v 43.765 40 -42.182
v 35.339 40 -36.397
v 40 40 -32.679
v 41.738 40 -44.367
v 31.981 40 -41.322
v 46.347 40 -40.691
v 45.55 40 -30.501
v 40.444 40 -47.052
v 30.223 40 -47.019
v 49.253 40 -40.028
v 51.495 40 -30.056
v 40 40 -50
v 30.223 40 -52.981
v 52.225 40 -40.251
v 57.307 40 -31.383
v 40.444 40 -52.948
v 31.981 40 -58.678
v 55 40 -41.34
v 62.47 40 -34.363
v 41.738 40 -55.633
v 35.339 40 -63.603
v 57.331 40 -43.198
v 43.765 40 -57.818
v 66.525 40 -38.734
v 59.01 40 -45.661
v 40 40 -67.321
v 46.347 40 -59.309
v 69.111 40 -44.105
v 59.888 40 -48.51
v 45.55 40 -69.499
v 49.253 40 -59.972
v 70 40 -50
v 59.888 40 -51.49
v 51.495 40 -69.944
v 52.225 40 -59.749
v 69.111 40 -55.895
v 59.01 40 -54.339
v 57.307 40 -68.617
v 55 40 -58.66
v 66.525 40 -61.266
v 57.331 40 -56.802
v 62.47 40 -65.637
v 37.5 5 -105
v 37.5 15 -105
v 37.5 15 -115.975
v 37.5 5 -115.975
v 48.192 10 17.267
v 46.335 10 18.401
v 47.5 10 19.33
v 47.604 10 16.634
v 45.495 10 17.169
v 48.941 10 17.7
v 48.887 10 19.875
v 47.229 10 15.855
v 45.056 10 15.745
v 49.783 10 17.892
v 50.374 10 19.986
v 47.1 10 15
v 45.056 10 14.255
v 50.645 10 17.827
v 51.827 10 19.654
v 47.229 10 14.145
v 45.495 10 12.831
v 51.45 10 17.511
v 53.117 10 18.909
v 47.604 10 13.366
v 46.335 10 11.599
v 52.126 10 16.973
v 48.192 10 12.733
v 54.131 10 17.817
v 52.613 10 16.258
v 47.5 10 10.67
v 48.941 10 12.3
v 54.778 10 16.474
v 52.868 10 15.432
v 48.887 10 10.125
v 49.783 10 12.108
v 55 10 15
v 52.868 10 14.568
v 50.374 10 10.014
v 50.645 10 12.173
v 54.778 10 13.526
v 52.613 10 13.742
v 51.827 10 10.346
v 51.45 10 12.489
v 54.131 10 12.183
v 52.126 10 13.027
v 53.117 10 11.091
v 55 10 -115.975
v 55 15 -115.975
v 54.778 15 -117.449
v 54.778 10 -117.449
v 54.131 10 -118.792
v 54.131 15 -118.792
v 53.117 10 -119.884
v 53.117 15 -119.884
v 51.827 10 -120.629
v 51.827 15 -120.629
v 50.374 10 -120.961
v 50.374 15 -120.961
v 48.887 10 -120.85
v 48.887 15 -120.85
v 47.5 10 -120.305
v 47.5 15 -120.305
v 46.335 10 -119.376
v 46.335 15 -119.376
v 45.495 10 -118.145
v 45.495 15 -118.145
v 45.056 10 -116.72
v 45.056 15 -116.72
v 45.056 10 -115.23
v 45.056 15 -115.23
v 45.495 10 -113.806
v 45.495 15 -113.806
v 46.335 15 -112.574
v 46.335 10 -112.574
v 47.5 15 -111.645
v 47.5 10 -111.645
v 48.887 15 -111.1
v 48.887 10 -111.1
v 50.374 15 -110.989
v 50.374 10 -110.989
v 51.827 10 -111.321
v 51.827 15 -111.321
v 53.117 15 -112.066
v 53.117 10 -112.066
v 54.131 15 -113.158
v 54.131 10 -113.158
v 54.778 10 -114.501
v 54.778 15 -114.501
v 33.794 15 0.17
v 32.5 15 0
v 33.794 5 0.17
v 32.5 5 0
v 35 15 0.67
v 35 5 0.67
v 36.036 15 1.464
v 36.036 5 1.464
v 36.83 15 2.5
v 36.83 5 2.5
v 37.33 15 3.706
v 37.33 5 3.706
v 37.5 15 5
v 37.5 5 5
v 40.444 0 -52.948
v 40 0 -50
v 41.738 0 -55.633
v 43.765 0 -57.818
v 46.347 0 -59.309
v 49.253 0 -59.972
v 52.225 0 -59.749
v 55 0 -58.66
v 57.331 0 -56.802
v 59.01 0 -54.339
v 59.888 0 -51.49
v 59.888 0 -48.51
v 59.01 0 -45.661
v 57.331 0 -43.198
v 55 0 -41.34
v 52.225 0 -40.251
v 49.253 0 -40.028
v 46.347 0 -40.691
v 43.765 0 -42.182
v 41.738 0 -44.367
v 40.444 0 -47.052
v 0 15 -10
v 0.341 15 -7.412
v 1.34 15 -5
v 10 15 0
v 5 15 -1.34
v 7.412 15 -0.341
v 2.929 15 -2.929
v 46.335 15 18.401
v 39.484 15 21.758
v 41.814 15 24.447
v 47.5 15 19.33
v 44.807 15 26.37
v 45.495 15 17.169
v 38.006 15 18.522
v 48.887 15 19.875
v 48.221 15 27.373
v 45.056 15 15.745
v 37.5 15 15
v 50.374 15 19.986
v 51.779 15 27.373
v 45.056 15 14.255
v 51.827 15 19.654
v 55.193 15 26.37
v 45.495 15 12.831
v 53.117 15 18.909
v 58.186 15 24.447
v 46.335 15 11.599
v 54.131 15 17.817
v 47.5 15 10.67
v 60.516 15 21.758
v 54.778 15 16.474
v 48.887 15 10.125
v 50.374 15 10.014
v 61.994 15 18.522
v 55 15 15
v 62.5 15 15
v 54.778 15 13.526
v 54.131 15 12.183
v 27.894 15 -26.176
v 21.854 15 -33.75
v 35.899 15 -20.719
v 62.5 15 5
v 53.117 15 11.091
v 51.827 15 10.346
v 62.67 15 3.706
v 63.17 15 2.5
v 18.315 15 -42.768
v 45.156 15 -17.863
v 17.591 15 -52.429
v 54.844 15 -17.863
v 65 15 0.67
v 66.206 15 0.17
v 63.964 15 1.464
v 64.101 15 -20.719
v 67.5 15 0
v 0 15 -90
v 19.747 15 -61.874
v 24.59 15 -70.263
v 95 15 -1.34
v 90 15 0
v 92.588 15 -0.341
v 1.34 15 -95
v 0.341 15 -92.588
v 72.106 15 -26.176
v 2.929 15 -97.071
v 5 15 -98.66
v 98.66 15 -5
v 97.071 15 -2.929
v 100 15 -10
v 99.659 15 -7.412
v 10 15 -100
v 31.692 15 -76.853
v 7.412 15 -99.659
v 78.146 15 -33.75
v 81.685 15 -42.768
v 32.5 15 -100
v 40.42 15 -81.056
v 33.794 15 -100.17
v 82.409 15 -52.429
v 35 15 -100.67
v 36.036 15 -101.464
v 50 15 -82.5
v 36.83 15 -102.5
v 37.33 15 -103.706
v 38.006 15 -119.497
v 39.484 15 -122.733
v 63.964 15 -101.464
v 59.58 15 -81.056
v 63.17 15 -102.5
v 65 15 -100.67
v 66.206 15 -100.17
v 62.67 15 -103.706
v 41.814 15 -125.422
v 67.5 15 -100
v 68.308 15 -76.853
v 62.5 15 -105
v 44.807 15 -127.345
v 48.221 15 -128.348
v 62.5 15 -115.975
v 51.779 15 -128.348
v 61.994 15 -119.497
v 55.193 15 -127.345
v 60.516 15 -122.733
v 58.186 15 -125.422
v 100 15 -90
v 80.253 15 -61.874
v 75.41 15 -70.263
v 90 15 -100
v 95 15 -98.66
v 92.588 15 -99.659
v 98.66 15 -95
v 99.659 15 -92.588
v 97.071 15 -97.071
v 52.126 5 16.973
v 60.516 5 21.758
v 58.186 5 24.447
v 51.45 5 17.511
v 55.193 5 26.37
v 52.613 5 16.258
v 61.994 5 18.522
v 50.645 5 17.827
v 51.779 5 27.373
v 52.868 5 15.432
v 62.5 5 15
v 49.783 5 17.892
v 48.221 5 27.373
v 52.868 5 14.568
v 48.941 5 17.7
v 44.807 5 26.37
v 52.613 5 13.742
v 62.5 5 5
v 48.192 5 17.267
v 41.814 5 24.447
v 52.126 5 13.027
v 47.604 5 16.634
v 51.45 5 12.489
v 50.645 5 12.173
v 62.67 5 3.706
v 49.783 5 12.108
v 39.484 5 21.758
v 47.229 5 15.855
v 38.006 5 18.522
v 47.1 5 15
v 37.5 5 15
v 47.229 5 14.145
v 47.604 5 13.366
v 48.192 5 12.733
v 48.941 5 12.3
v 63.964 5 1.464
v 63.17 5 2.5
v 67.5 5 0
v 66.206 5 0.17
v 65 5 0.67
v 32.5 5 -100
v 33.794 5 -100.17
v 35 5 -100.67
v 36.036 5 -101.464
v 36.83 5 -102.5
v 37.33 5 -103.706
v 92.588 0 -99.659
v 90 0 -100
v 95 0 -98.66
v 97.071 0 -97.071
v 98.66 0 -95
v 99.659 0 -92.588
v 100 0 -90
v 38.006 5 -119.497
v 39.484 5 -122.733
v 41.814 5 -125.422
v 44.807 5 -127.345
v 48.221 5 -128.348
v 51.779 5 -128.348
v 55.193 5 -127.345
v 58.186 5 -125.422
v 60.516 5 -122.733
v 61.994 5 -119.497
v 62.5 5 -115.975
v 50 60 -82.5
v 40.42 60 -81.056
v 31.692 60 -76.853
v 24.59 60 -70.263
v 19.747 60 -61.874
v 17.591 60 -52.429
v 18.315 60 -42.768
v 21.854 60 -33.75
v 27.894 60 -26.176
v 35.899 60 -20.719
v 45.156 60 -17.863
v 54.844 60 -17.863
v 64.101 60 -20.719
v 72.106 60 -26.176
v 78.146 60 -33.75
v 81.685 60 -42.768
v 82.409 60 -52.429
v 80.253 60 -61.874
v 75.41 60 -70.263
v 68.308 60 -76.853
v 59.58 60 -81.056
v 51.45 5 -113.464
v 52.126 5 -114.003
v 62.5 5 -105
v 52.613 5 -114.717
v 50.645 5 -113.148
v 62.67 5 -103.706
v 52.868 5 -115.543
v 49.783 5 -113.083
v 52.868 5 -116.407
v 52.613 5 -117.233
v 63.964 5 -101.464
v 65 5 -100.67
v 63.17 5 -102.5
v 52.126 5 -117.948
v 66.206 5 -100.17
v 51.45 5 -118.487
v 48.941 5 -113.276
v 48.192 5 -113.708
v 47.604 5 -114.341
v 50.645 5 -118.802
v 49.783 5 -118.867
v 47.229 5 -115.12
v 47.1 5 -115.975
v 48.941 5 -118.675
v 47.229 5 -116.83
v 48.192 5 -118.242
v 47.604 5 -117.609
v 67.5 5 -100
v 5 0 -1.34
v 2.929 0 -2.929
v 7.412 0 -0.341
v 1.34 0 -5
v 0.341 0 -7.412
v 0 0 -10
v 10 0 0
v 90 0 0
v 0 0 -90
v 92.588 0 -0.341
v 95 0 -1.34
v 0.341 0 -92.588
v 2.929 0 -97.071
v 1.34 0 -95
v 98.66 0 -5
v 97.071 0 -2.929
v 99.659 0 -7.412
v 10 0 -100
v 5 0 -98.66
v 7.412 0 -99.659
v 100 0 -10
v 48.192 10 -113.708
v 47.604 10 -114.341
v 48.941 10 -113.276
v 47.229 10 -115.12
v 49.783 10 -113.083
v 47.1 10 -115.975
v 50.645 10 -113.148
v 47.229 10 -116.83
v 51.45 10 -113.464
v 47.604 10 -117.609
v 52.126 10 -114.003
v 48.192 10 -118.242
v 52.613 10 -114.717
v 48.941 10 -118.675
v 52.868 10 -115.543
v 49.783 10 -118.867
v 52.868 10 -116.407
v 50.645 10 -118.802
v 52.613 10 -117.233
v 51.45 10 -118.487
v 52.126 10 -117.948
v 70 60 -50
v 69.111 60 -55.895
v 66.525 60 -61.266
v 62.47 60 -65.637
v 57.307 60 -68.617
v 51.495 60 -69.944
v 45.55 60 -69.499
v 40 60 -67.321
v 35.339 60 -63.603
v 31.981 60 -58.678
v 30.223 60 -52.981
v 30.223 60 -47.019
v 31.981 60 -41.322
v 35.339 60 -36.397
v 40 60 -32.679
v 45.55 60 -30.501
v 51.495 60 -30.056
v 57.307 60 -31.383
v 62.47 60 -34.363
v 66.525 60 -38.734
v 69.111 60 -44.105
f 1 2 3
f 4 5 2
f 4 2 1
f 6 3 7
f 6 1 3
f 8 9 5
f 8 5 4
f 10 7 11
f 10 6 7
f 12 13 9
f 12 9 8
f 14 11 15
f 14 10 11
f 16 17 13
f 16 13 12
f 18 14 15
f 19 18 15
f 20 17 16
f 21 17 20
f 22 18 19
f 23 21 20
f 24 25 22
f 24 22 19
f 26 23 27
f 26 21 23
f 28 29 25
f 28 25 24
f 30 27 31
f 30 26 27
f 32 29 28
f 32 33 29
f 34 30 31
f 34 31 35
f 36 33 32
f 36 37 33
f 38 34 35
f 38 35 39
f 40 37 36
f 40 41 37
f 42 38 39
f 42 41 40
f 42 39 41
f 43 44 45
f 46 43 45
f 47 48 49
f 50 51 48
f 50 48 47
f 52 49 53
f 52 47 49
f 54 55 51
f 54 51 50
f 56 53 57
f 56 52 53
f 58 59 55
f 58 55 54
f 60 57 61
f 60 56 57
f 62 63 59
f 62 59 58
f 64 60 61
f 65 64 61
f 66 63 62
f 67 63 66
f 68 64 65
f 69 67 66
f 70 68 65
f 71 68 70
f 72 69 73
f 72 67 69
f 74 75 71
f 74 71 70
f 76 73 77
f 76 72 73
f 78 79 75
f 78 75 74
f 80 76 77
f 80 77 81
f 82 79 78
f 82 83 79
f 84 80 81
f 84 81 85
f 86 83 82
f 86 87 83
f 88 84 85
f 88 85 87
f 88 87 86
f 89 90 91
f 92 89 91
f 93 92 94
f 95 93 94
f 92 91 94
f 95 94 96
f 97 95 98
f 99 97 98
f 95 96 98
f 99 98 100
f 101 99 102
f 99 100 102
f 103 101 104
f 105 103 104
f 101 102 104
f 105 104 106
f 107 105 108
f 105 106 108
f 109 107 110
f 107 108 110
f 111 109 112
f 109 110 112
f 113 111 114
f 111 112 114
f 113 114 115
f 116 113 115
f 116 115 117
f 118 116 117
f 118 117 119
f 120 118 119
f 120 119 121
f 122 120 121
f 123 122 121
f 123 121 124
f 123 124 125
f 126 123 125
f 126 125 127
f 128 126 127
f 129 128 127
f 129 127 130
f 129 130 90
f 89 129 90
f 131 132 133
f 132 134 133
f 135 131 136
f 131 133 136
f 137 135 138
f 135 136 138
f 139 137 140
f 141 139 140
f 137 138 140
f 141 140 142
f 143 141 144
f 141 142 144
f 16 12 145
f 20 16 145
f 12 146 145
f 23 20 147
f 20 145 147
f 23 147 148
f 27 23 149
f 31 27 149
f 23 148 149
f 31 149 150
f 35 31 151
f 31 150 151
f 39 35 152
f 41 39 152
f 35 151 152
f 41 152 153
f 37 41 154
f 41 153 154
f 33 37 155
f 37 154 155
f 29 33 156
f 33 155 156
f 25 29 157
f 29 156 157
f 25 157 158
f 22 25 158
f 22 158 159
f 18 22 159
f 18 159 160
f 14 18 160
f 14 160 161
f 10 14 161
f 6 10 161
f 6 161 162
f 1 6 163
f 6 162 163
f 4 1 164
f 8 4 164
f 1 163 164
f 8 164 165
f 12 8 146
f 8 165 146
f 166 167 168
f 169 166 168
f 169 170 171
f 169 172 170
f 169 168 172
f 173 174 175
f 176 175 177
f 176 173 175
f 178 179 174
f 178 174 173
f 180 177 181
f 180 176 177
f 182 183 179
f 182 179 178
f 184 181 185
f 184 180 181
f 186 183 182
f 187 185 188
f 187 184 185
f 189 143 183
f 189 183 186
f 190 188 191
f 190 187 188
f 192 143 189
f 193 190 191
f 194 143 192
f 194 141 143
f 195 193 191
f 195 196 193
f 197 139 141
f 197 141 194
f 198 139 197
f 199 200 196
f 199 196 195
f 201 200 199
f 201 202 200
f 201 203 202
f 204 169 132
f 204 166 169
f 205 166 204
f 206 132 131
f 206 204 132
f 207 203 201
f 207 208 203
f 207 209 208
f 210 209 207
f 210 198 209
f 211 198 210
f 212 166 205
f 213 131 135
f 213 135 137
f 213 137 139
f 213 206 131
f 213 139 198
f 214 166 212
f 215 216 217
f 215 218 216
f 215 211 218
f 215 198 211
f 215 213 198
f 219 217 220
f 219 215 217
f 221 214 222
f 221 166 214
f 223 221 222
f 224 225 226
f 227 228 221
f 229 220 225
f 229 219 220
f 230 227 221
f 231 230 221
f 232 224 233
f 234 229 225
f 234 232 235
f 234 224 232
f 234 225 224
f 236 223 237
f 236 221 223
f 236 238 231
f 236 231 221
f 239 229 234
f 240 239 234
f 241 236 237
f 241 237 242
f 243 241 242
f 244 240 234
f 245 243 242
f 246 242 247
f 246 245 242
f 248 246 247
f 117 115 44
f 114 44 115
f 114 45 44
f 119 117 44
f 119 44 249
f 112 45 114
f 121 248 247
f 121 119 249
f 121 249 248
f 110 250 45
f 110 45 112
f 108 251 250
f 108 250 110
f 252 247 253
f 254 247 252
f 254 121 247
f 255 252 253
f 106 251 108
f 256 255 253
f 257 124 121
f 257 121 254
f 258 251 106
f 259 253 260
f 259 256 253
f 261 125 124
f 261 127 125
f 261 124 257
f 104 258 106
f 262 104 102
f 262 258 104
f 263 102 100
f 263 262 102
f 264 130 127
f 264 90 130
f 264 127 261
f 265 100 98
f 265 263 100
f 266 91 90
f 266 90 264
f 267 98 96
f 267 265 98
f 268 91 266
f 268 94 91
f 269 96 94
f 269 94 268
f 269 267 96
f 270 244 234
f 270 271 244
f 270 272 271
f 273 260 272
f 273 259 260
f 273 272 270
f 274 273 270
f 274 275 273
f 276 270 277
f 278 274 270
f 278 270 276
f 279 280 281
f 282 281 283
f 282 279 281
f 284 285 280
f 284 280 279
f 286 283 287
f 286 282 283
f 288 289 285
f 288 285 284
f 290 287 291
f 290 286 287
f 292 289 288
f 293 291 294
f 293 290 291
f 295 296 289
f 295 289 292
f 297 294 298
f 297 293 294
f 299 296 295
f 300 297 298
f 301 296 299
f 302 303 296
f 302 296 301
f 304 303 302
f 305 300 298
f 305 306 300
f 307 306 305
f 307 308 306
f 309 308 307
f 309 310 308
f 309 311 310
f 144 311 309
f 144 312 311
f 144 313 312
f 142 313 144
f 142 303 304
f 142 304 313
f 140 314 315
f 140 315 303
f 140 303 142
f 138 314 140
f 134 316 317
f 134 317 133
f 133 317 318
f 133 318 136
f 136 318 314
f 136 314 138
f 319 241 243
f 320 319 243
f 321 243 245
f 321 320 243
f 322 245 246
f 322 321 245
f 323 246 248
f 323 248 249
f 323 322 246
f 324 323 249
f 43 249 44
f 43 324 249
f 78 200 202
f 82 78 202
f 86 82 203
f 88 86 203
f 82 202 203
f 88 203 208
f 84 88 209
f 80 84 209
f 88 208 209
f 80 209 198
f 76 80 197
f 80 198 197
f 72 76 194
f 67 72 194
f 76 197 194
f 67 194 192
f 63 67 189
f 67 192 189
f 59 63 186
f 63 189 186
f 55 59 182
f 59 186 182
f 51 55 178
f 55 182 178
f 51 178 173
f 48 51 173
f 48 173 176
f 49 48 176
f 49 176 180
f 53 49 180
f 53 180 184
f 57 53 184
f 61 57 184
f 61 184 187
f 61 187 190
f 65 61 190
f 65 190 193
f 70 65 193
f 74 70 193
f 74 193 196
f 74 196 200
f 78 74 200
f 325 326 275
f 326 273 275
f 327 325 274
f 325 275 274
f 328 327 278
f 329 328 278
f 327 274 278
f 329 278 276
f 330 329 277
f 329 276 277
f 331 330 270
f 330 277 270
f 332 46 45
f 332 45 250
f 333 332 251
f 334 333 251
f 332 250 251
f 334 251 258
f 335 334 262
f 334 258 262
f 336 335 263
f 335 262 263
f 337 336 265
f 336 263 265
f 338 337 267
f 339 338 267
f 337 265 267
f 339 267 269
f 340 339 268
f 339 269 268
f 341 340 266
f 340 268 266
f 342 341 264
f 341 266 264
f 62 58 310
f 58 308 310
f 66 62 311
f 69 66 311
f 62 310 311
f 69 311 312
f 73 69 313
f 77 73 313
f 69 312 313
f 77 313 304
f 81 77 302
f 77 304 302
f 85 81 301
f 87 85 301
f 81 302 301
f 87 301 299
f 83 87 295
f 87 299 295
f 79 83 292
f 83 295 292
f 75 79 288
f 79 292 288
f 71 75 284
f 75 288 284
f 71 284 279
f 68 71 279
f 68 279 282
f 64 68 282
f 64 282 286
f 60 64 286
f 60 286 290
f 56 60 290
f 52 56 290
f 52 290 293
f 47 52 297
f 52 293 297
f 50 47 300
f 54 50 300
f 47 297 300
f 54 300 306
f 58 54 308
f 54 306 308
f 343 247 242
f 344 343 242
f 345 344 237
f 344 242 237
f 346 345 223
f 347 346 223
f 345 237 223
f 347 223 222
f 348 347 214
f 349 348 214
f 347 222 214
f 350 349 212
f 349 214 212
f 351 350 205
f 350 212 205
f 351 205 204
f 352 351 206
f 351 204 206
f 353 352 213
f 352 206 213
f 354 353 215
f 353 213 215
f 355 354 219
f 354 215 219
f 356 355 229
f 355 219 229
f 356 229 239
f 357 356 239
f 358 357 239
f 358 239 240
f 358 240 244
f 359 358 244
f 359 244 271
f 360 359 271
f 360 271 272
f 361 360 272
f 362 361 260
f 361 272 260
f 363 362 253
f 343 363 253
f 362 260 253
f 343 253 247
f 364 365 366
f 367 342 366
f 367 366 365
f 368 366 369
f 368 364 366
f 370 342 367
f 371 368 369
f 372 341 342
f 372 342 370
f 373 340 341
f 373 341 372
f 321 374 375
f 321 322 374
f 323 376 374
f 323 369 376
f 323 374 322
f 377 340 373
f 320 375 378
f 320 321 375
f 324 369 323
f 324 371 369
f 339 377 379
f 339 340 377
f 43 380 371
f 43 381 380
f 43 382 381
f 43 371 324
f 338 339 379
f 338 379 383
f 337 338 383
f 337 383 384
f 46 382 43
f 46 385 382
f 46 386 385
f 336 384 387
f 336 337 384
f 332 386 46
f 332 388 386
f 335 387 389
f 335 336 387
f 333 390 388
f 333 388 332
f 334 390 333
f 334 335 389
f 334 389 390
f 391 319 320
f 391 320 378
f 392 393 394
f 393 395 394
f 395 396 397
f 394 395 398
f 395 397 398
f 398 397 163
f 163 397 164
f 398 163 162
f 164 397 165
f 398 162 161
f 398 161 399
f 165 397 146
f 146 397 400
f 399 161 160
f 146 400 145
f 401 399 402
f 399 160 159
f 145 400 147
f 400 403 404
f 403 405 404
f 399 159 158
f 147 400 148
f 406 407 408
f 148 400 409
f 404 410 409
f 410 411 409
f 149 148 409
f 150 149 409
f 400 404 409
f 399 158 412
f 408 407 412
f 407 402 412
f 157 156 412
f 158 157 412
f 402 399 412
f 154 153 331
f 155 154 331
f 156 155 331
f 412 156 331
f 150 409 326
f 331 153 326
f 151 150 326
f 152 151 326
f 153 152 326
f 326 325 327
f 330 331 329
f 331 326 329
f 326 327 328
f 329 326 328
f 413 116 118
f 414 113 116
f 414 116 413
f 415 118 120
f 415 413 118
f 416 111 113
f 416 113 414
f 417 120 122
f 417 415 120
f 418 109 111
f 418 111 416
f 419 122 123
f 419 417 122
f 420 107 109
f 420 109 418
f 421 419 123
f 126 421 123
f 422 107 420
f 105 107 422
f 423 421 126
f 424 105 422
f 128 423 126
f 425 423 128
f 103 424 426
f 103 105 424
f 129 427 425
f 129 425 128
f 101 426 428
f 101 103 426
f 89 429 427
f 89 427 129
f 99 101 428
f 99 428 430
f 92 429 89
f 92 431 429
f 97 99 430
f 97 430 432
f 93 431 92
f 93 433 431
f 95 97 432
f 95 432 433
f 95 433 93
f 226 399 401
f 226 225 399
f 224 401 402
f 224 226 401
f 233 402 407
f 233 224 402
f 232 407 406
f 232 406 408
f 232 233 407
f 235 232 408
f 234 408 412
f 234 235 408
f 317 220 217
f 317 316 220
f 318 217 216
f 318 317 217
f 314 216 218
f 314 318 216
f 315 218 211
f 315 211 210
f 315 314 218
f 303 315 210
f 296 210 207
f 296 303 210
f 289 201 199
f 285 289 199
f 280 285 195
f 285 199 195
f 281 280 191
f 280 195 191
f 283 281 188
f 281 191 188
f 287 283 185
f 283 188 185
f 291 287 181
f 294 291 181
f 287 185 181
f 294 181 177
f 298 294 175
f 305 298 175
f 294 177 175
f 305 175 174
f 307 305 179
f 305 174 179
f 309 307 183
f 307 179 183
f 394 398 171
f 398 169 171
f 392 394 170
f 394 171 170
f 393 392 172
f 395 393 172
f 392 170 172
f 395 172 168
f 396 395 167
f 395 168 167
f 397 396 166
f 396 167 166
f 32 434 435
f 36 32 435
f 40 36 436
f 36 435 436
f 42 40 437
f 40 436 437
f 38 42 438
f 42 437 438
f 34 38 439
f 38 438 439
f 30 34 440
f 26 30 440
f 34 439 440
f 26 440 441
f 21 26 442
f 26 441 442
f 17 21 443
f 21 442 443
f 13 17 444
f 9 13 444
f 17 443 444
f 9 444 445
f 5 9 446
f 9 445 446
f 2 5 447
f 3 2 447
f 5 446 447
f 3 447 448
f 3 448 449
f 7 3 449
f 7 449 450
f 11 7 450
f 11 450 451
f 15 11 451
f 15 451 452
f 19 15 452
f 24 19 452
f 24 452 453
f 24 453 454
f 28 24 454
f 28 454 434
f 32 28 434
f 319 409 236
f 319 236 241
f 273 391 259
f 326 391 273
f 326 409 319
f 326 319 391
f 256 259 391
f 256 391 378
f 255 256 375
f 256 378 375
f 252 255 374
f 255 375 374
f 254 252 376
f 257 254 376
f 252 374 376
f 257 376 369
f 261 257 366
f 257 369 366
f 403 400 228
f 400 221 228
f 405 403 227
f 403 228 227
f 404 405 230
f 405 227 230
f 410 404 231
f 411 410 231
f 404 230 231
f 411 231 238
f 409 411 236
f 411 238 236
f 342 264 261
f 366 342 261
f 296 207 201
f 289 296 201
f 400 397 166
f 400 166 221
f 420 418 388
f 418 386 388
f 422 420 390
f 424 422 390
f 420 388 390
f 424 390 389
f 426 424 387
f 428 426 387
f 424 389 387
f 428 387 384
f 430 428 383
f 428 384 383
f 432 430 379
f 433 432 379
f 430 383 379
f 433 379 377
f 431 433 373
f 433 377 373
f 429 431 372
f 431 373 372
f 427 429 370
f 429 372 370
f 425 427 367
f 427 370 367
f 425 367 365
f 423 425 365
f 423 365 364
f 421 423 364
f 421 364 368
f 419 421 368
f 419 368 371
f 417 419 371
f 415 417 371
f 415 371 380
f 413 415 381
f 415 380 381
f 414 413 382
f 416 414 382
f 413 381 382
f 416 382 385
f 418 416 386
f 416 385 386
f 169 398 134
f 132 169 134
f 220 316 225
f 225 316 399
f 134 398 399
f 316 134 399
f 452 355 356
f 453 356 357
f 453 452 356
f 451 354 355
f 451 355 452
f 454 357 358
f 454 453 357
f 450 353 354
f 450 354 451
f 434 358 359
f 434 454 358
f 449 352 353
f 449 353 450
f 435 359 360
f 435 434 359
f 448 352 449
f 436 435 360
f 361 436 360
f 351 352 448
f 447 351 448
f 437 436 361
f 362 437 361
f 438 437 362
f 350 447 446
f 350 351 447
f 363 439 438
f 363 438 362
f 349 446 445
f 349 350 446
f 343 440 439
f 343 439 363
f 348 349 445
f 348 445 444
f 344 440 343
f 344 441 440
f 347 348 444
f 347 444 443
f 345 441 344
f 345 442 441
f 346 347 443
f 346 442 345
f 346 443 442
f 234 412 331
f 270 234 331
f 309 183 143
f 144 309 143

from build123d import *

# Parameters (mm, degrees)
SKETCH1_W                                = 100
SKETCH1_H                                = 100
BOSS_EXTRUDE1_DEPTH                      = 15
BOSS_EXTRUDE2_DEPTH                      = 10
CBORE_FOR_M5_HEX_HEAD_BOLT2_D            = 5.8
CBORE_FOR_M5_HEX_HEAD_BOLT2_CBORE_D      = 10
CBORE_FOR_M5_HEX_HEAD_BOLT2_CBORE_DEPTH  = 5
FILLET1_R                                = 5
FILLET2_R                                = 10
SKETCH11_R                               = 32.5
BOSS_EXTRUDE3_DEPTH                      = 45
CBORE_FOR_M36_HEX_HEAD_BOLT2_D           = 20
CBORE_FOR_M36_HEX_HEAD_BOLT2_CBORE_D     = 40
CBORE_FOR_M36_HEX_HEAD_BOLT2_CBORE_DEPTH = 20


with BuildPart() as part:
    # Sketch1 → Boss-Extrude1 (new body)
    with BuildSketch(Plane(origin=(0, 0, 0), x_dir=(1, 0, 0), z_dir=(0, 1, 0))):
        with Locations((50, 50)):
            Rectangle(SKETCH1_W, SKETCH1_H)
    extrude(amount=BOSS_EXTRUDE1_DEPTH)

    # Sketch3 → Boss-Extrude2 (add)
    with BuildSketch(Plane(origin=(0, 15, 0), x_dir=(1, 0, 0), z_dir=(0, 1, 0))):
        with BuildLine():
            Line((37.5, 100), (37.5, 115.975098948))
            ThreePointArc((37.5, 115.975098948), (50, 128.475098948), (62.5, 115.975098948))
            Line((62.5, 115.975098948), (62.5, 100))
            Line((62.5, 100), (37.5, 100))
        make_face()
        with BuildLine():
            Line((62.5, 0), (62.5, -15))
            ThreePointArc((62.5, -15), (50, -27.5), (37.5, -15))
            Line((37.5, -15), (37.5, 0))
            Line((37.5, 0), (62.5, 0))
        make_face()
    extrude(amount=-BOSS_EXTRUDE2_DEPTH)

    # CBORE for M5 Hex Head Bolt2 (through all)
    with Locations(Plane(origin=(0, 15, 0), x_dir=(1, 0, 0), z_dir=(0, 1, 0))):
        with Locations((50, 115.975098948), (50, -15)):
            CounterBoreHole(CBORE_FOR_M5_HEX_HEAD_BOLT2_D / 2, CBORE_FOR_M5_HEX_HEAD_BOLT2_CBORE_D / 2, CBORE_FOR_M5_HEX_HEAD_BOLT2_CBORE_DEPTH)

    # Fillet1
    fillet1_edges = [part.edges().sort_by_distance(p)[0] for p in [
        (62.5, 10, -100),
        (37.5, 10, -100),
        (37.5, 10, 0),
        (62.5, 10, 0),
    ]]
    fillet(fillet1_edges, radius=FILLET1_R)

    # Fillet2
    fillet2_edges = [part.edges().sort_by_distance(p)[0] for p in [
        (0, 7.5, -100),
        (100, 7.5, -100),
        (100, 7.5, 0),
        (0, 7.5, 0),
    ]]
    fillet(fillet2_edges, radius=FILLET2_R)

    # Sketch11 → Boss-Extrude3 (add)
    with BuildSketch(Plane(origin=(0, 15, 0), x_dir=(1, 0, 0), z_dir=(0, 1, 0))):
        with Locations(Location((50, 50, 0), (0, 0, 90))):
            Circle(SKETCH11_R)
    extrude(amount=BOSS_EXTRUDE3_DEPTH)

    # CBORE for M36 Hex Head Bolt2 (through all)
    with Locations(Plane(origin=(0, 60, 0), x_dir=(1, 0, 0), z_dir=(0, 1, 0))):
        with Locations((50, 50)):
            CounterBoreHole(CBORE_FOR_M36_HEX_HEAD_BOLT2_D / 2, CBORE_FOR_M36_HEX_HEAD_BOLT2_CBORE_D / 2, CBORE_FOR_M36_HEX_HEAD_BOLT2_CBORE_DEPTH)


solid = part.part
